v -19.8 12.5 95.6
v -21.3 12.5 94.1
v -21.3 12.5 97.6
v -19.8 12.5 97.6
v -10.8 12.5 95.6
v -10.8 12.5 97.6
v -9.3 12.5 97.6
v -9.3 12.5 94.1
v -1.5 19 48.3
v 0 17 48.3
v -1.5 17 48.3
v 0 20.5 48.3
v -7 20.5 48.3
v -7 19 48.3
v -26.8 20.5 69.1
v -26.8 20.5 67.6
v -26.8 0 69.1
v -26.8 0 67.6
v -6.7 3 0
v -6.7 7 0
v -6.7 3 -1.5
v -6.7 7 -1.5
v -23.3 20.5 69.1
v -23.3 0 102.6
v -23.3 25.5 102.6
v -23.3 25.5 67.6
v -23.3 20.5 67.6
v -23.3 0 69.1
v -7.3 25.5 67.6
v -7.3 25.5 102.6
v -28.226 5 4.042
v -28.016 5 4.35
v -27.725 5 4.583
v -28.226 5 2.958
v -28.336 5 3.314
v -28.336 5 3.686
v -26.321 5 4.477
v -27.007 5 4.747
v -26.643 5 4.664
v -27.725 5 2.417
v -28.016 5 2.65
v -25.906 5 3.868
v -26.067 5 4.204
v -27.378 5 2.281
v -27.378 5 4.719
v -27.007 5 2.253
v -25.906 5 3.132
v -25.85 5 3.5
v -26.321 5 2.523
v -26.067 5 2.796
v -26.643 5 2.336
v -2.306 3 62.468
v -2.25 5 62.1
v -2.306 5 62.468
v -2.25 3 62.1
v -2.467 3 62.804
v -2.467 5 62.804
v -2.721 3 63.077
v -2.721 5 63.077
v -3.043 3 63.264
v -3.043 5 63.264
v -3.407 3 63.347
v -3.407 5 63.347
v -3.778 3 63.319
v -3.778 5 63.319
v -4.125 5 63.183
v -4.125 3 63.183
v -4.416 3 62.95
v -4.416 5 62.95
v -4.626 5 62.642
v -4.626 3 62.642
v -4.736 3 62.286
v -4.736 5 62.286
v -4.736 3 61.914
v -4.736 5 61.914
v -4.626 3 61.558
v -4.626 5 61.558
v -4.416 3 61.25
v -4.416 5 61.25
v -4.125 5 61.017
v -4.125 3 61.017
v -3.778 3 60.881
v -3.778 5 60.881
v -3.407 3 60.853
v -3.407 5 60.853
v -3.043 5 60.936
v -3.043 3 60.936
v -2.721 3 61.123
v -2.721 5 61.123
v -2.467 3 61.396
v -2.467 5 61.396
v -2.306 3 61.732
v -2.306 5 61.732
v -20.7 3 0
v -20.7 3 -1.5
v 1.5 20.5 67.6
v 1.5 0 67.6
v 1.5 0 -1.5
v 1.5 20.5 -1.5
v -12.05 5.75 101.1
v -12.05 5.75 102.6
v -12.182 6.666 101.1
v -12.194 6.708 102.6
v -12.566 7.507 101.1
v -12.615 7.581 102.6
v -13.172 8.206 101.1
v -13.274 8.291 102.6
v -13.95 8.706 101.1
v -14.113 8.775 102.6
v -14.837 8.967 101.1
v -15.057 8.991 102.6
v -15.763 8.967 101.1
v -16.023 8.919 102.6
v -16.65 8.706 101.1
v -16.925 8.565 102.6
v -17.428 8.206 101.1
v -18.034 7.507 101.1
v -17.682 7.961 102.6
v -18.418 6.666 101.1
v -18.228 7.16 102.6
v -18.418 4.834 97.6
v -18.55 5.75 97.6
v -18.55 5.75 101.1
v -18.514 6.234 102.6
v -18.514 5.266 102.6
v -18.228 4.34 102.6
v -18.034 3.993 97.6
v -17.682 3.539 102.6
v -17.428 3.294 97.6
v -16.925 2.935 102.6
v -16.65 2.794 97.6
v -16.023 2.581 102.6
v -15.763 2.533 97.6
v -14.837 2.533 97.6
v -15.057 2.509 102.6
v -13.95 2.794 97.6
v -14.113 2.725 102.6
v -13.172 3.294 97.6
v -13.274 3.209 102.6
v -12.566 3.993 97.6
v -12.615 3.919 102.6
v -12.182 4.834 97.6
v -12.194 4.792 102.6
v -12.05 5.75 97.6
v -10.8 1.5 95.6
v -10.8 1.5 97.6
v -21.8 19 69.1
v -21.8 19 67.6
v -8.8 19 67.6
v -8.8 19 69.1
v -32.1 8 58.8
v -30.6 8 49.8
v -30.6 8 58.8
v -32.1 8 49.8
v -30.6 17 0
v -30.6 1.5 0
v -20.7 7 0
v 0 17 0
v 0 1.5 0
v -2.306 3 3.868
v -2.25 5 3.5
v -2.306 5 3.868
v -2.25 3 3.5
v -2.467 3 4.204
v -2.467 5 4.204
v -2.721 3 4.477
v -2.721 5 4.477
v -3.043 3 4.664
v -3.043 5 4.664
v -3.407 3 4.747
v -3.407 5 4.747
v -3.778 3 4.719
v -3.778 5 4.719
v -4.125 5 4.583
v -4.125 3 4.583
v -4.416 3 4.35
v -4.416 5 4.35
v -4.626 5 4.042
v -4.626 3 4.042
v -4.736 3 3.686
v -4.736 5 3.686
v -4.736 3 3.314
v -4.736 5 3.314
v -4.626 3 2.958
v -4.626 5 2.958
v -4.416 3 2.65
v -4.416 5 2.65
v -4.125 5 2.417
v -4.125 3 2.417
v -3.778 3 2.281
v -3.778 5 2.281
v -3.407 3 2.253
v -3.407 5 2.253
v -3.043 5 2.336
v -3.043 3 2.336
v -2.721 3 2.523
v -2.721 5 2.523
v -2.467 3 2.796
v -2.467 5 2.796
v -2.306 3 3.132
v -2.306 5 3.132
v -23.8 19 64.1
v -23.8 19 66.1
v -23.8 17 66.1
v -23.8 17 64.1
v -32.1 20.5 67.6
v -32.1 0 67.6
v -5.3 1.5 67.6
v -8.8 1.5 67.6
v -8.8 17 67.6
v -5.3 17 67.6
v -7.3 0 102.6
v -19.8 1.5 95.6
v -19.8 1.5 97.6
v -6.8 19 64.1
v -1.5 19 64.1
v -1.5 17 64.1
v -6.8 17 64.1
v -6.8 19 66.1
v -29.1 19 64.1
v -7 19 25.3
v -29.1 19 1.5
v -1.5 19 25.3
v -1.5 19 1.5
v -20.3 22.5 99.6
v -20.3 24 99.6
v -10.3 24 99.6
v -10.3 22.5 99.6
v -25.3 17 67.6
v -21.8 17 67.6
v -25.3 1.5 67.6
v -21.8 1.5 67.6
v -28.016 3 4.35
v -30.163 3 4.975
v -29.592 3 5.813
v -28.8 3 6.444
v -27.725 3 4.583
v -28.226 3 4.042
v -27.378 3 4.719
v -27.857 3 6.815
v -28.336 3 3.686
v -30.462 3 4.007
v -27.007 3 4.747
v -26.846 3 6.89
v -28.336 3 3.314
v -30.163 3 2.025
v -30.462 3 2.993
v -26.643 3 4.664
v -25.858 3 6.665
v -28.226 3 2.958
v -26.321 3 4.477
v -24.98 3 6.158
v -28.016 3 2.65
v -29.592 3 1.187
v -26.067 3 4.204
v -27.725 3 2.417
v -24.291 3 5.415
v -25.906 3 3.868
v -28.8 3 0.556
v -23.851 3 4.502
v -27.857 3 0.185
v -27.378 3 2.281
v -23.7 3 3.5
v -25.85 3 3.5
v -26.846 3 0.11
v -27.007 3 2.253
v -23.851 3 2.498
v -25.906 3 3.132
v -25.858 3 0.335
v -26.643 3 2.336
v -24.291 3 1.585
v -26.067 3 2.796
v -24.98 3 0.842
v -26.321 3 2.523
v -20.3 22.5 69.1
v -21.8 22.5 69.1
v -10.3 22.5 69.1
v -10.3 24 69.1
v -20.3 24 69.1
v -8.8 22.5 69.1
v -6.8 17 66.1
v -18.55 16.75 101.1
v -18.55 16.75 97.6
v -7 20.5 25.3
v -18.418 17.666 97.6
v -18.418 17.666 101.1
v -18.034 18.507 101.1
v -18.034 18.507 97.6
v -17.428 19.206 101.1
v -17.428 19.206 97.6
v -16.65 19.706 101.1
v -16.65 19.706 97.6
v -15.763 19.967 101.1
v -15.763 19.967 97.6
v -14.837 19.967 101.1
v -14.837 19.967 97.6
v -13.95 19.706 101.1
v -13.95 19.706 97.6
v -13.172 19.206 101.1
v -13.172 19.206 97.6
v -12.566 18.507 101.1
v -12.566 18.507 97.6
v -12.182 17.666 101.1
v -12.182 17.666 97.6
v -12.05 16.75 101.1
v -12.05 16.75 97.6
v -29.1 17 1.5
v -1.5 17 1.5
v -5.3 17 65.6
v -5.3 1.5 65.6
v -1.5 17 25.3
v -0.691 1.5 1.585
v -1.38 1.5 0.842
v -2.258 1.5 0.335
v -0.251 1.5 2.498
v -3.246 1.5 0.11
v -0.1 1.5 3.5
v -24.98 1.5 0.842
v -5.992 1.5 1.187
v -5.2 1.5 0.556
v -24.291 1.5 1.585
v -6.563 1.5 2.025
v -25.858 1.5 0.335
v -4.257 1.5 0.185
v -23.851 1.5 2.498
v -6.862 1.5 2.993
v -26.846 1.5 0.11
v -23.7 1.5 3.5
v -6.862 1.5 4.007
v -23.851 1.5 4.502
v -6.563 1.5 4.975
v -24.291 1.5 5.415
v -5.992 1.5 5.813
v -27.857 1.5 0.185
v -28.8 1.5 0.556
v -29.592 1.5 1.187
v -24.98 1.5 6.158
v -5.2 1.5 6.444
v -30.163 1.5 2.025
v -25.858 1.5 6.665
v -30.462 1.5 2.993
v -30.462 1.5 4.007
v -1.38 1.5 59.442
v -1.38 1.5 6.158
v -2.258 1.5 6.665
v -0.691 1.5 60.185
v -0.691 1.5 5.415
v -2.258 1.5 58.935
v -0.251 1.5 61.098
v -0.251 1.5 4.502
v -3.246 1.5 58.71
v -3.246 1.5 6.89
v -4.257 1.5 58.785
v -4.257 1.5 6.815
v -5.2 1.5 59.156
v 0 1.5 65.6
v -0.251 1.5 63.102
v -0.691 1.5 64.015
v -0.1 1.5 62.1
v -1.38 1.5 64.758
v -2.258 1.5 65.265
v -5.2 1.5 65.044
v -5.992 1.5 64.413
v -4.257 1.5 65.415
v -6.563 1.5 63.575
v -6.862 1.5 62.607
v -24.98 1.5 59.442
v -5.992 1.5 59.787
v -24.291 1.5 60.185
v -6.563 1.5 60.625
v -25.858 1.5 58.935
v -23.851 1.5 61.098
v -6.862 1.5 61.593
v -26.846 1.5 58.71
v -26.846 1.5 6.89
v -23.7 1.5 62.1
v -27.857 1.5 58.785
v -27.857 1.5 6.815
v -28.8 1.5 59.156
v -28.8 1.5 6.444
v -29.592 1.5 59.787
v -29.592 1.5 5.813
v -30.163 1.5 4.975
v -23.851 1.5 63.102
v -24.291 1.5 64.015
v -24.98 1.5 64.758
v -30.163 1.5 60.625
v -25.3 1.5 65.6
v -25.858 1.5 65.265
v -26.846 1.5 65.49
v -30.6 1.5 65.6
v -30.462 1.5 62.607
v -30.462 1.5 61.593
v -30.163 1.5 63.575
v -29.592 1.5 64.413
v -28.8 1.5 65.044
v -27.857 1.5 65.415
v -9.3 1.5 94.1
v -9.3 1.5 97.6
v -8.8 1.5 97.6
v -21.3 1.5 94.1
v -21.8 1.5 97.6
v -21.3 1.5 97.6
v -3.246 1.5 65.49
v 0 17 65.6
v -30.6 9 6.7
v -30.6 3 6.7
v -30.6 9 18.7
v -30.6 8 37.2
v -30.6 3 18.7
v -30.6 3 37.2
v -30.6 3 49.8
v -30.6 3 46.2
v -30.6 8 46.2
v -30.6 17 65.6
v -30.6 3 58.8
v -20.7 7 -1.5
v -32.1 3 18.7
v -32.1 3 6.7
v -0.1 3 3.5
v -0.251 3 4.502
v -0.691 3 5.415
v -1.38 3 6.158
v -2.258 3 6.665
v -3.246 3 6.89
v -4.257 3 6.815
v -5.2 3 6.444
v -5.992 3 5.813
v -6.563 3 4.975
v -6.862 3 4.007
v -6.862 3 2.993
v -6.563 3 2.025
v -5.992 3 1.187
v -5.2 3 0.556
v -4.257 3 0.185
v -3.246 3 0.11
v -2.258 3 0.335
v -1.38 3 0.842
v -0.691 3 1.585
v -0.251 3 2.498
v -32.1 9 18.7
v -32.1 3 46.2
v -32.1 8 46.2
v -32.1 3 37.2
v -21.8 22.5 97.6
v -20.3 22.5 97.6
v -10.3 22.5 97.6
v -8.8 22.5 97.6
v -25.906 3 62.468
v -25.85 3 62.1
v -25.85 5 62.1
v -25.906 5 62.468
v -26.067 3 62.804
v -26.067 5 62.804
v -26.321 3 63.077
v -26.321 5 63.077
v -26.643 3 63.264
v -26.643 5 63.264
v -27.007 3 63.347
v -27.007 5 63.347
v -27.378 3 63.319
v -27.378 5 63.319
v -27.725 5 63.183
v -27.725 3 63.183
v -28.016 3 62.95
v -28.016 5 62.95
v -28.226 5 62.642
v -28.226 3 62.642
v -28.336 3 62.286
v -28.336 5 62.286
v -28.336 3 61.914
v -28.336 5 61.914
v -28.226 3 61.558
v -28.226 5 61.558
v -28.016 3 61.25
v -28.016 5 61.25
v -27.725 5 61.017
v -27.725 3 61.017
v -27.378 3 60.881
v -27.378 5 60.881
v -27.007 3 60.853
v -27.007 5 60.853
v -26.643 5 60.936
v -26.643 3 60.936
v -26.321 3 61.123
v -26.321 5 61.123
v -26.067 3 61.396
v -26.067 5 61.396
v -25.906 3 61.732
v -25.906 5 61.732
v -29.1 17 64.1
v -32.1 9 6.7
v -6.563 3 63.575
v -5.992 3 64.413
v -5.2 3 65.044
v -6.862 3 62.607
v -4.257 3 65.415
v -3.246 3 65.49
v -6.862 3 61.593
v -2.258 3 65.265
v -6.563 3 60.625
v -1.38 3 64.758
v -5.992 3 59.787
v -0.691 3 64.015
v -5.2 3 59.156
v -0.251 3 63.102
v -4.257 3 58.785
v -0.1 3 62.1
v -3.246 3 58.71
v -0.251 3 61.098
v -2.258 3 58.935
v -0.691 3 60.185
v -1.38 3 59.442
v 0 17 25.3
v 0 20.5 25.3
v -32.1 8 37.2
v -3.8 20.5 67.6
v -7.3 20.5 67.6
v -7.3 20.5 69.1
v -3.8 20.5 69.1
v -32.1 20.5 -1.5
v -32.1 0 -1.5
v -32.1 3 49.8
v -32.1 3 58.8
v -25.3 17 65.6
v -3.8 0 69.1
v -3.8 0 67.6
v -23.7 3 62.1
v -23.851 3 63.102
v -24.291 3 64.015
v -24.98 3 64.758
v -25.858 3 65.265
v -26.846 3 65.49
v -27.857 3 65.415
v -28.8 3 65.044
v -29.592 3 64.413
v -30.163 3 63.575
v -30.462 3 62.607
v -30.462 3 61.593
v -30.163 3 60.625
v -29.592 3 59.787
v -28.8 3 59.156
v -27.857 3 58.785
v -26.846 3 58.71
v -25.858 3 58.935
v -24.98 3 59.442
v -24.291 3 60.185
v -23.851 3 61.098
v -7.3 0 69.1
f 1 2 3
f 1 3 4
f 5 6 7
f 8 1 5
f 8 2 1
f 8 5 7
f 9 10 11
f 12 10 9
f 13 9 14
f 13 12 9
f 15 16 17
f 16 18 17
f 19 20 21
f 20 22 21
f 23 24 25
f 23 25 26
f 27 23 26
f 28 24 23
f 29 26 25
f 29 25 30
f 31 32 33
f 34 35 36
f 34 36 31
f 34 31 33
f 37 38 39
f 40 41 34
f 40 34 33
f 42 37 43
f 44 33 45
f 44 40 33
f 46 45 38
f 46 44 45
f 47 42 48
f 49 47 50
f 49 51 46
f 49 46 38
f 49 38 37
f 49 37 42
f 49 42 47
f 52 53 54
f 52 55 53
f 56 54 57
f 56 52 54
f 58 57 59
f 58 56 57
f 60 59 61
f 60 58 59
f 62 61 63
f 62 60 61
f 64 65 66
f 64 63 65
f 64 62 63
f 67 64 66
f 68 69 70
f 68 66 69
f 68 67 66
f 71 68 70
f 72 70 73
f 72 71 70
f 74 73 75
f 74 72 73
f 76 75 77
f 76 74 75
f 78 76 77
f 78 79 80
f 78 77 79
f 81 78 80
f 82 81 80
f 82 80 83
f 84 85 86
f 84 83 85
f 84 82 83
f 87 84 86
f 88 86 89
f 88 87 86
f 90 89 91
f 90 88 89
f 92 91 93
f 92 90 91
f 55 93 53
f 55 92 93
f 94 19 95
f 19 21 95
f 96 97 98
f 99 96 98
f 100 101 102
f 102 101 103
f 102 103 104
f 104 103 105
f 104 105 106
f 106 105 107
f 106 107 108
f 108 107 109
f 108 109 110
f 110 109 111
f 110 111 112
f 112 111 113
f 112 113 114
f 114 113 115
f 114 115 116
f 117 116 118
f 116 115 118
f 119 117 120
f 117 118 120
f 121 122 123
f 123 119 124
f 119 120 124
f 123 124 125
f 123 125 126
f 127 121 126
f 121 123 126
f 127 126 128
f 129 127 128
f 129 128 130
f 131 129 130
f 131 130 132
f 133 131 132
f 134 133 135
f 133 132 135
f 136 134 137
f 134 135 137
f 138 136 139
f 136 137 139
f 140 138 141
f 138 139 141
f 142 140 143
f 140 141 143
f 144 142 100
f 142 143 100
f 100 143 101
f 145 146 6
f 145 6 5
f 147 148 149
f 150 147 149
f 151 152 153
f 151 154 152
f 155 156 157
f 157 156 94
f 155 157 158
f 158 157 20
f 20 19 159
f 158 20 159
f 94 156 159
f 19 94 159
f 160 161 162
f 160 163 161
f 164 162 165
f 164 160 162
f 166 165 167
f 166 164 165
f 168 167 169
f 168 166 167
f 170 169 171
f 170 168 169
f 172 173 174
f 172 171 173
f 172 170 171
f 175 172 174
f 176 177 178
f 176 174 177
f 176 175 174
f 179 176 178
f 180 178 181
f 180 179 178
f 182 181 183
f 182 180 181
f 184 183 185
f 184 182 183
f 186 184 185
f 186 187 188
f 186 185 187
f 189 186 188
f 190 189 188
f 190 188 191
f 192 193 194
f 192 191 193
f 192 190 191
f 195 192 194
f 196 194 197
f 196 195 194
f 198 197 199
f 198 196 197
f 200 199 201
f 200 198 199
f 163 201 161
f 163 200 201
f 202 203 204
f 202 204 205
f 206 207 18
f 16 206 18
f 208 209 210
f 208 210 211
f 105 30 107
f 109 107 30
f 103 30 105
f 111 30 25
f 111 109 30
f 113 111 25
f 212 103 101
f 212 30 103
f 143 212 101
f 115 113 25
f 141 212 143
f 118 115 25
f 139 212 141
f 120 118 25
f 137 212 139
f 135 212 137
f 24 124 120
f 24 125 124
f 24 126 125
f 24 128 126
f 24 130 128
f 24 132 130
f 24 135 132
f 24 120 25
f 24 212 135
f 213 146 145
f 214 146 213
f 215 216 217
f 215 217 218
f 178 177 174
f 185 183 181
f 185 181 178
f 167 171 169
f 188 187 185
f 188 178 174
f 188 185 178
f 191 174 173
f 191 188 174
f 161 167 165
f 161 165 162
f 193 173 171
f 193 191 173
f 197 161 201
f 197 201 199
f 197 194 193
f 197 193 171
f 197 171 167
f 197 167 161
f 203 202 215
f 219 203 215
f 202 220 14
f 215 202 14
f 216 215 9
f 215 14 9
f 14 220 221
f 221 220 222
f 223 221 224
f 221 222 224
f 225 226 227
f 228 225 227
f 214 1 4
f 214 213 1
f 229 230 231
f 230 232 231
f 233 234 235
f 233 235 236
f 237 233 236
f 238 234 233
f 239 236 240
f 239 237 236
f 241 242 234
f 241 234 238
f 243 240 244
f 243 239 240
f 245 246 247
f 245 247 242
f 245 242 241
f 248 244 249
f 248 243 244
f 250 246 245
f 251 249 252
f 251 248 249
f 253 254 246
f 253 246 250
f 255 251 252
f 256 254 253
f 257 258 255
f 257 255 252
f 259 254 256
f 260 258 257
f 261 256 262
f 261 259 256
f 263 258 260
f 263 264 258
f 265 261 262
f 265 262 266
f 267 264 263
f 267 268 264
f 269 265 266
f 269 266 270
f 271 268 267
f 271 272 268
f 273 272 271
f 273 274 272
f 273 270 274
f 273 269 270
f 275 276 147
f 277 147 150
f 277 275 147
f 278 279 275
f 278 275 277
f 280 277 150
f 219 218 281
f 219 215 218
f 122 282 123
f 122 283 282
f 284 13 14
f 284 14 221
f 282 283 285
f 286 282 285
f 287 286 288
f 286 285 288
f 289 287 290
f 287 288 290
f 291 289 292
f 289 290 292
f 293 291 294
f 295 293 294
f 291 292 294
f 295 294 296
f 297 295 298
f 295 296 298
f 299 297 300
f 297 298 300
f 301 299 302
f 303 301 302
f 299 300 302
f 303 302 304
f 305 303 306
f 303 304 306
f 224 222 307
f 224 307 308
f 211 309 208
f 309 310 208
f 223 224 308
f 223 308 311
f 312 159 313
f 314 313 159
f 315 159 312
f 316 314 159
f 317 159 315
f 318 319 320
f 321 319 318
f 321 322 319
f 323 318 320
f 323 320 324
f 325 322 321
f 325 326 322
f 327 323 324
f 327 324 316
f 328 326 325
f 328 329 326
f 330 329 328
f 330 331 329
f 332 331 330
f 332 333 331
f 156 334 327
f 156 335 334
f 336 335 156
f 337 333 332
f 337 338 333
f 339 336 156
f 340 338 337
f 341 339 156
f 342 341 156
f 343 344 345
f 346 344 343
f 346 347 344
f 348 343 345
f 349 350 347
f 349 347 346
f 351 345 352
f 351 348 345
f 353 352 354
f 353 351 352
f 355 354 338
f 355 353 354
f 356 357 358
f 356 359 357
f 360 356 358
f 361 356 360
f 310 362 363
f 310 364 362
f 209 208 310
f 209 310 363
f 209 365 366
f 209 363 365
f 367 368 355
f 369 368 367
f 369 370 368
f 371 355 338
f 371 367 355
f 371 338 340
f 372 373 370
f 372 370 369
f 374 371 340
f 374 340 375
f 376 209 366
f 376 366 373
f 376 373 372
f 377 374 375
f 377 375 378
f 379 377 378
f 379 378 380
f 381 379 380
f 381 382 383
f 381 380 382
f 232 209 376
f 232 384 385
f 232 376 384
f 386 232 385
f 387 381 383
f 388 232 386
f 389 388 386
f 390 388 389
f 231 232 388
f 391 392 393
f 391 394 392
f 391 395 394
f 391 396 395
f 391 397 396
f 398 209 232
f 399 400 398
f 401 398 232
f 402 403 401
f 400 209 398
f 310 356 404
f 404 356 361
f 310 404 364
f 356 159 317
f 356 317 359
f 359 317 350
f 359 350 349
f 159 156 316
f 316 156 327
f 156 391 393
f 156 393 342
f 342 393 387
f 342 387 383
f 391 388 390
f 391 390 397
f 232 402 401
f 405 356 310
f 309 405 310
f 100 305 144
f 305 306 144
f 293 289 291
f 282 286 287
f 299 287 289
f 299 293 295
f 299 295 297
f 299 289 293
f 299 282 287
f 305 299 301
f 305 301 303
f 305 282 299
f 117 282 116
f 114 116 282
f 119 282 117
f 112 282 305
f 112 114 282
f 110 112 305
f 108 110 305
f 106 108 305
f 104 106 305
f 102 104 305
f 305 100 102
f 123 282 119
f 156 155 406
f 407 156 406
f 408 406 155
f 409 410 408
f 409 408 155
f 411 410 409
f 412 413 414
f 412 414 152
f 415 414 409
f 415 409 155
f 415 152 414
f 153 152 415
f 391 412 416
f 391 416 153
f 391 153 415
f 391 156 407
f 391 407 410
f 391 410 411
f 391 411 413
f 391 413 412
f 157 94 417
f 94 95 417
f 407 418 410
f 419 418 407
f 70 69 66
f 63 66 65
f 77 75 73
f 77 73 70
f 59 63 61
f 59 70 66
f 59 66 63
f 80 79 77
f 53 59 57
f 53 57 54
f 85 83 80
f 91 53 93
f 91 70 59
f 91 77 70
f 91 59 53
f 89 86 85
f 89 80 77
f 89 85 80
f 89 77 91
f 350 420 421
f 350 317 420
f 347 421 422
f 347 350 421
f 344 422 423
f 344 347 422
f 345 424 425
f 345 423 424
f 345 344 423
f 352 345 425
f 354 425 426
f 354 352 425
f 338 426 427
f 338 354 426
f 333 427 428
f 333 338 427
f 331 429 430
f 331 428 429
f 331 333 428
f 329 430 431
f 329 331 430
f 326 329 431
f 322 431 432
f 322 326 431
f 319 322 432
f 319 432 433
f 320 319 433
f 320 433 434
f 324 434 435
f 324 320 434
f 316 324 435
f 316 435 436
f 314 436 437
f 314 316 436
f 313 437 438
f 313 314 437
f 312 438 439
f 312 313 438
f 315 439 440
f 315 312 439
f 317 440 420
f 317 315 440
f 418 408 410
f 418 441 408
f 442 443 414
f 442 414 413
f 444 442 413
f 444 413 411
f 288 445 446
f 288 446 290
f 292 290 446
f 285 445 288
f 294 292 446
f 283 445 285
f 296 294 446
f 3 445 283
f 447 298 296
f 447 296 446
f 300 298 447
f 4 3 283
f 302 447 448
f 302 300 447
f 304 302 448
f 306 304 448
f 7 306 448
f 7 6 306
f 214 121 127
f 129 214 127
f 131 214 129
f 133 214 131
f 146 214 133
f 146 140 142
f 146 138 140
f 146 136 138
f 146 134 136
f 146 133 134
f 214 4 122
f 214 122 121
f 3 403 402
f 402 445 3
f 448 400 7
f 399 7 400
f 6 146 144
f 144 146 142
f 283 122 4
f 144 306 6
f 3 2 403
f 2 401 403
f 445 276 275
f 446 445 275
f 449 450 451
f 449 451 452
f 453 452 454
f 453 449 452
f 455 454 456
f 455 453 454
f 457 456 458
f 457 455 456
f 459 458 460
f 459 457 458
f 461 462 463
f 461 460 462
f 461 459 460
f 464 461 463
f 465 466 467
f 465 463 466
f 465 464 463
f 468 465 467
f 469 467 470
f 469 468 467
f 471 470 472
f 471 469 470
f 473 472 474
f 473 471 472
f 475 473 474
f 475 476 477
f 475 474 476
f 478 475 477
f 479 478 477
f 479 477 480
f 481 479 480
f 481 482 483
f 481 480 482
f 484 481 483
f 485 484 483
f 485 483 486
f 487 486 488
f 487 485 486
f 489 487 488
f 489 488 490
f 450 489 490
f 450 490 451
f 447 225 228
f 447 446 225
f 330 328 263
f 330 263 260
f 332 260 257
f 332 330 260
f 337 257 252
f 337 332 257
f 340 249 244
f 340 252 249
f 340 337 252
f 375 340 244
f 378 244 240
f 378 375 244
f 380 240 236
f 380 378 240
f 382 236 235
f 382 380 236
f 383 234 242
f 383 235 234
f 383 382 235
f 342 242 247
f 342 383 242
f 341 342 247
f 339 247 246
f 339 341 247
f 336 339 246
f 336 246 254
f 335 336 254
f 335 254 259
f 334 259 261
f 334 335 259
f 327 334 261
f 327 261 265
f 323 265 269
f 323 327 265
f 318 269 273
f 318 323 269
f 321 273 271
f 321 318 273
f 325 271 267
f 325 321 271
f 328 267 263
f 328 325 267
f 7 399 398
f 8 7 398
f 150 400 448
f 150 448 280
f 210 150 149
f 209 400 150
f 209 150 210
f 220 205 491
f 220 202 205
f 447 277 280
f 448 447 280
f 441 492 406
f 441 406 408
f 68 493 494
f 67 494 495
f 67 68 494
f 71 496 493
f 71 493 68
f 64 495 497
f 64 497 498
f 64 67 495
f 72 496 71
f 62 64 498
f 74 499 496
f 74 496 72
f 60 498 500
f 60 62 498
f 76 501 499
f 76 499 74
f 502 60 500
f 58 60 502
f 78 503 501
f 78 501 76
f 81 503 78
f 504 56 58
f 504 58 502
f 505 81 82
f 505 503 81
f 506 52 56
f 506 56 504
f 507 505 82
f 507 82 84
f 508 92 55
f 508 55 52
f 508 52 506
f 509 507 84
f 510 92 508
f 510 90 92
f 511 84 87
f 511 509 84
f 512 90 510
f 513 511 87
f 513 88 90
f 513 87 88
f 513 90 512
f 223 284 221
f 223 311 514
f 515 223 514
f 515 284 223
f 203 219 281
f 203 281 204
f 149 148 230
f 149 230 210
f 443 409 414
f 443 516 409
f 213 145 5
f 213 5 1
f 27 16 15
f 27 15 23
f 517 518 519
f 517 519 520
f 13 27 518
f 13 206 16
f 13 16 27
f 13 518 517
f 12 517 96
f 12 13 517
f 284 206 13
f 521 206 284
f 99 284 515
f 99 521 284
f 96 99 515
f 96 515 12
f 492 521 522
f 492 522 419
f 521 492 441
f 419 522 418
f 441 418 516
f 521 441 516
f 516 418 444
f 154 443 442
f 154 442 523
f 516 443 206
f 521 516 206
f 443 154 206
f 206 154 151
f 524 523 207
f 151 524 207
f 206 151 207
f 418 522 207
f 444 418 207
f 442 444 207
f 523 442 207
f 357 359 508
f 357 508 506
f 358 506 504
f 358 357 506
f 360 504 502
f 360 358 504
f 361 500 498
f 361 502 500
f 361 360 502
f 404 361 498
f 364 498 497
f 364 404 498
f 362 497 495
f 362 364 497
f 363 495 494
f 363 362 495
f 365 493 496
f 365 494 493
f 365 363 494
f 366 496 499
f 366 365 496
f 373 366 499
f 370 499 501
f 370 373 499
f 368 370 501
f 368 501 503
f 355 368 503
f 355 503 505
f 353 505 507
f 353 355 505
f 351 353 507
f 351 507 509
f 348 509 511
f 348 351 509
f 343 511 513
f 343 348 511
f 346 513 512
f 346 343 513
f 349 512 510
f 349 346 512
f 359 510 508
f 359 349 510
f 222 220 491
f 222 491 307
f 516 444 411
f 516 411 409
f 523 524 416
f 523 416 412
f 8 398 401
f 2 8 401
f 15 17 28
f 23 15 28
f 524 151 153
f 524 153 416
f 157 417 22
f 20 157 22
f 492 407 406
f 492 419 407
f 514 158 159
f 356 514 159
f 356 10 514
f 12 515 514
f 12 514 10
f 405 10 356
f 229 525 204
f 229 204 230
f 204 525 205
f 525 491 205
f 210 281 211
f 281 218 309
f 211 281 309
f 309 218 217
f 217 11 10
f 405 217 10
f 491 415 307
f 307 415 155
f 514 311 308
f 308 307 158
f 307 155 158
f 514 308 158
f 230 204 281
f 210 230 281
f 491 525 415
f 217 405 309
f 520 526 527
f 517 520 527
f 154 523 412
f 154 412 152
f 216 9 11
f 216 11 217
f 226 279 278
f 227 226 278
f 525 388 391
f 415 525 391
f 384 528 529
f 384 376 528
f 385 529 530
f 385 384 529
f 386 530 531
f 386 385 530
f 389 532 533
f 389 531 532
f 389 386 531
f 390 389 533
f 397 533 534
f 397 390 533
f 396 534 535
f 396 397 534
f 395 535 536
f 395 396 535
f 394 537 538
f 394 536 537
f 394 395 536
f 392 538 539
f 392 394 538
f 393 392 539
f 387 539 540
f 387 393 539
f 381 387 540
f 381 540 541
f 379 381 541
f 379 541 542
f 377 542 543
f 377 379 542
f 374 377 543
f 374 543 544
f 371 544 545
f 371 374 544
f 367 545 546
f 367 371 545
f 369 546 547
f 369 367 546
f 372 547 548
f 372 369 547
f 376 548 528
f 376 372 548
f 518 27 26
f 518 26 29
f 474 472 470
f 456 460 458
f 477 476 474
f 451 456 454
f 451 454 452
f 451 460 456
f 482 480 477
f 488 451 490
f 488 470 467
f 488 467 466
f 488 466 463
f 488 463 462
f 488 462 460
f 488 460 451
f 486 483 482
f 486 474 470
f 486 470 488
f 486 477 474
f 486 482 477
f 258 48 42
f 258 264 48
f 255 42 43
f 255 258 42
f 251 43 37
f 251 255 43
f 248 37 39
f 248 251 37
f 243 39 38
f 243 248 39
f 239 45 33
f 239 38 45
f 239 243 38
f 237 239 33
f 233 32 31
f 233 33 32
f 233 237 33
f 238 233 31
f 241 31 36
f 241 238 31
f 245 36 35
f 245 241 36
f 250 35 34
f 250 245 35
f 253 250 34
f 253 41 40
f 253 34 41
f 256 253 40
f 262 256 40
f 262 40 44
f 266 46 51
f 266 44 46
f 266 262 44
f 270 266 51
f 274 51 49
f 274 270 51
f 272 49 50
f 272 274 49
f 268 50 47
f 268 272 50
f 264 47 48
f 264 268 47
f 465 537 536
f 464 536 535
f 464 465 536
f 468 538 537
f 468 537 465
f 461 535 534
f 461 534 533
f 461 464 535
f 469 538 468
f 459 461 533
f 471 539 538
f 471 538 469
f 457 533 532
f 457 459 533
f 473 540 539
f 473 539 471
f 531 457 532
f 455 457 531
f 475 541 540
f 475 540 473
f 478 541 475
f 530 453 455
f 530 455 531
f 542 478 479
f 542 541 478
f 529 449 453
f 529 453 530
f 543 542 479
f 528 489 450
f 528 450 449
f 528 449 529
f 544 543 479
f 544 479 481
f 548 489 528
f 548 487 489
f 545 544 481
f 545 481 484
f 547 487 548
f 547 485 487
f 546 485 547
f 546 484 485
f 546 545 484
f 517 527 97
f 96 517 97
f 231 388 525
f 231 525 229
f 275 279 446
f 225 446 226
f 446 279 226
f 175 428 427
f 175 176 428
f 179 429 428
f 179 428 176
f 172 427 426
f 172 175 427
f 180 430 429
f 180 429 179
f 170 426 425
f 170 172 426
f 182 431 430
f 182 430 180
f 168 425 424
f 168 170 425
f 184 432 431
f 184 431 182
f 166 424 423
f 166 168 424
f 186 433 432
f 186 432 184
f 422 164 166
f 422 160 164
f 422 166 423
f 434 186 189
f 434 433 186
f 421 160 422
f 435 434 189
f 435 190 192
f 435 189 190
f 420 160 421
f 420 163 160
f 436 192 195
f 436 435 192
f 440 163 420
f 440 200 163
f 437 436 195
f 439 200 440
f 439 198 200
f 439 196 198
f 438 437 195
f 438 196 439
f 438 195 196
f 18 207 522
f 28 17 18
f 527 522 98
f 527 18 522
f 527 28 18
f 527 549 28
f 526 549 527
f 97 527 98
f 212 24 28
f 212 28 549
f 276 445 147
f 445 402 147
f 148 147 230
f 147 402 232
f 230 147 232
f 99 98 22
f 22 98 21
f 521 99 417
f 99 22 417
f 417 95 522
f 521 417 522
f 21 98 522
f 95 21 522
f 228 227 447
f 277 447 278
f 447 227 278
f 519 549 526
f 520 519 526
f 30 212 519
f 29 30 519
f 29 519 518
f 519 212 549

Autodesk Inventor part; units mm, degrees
ref_plane "YZ Plane" through (0, 0, 0) normal (1, 0, 0) x (0, 1, 0)
ref_plane "XZ Plane" through (0, 0, 0) normal (0, 1, 0) x (-1, 0, 0)
ref_plane "XY Plane" through (0, 0, 0) normal (0, 0, 1) x (1, 0, 0)
sketch "Szkic1" plane through (0, 0, 0) normal (0, 1, 0) x (-1, 0, 0)
  line L0 (0, 0) -> (30.6, 0)
  line L1 (30.6, 0) -> (30.6, 65.6)
  line L2 (30.6, 65.6) -> (0, 65.6)
  line L3 (0, 65.6) -> (0, 0)
  dimension "d0" = 30.6
  dimension "d1" = 65.6
extrude "Wyciągnięcie proste1" add sketch "Szkic1" along normal blind 1.5
sketch "Szkic2" plane through (0, 1.5, 0) normal (0, 1, 0) x (1, 0, 0)
  line L0 (-30.6, 0) -> (-30.6, -65.6) construction
  line L1 (-30.6, -65.6) -> (-30.6, -62.1) construction
  line L2 (-30.6, -62.1) -> (-27.1, -62.1) construction
  line L3 (0, 0) -> (-30.6, 0) construction
  line L4 (0, 0) -> (-3.5, 0) construction
  line L5 (-3.5, 0) -> (-3.5, -3.5) construction
  line L6 (-30.6, -65.6) -> (0, -65.6) construction
  line L7 (0, -65.6) -> (-3.5, -65.6) construction
  line L8 (-3.5, -65.6) -> (-3.5, -62.1) construction
  line L9 (-3.5, -62.1) -> (0, -62.1) construction
  line L10 (0, -62.1) -> (0, -65.6) construction
  line L11 (-30.6, 0) -> (-27.1, 0) construction
  line L12 (-27.1, 0) -> (-27.1, -3.5) construction
  line L13 (-27.1, -3.5) -> (-30.6, -3.5) construction
  line L14 (-30.6, -3.5) -> (-30.6, 0) construction
  circle A0 centre (-27.1, -62.1) radius 3.4
  circle A1 centre (-3.5, -62.1) radius 3.4
  circle A2 centre (-3.5, -3.5) radius 3.4
  circle A3 centre (-27.1, -3.5) radius 3.4
  dimension "d4" = 3.5
  dimension "d5" = 3.5
  dimension "d6" = 3.5
  dimension "d7" = 3.5
  dimension "d8" = 3.5
  dimension "d9" = 3.5
  dimension "d10" = 3.5
  dimension "d11" = 3.5
  dimension "d12" = 6.8
  dimension "d13" = 6.8
  dimension "d14" = 6.8
  dimension "d15" = 6.8
extrude "Wyciągnięcie proste2" add sketch "Szkic2" along normal blind 1.5
sketch "Szkic3" plane through (-27.1, 3, 62.1) normal (0, 1, 0) x (1, 0, 0)
  circle A0 centre (23.6, 0) radius 3.4 projected
  circle A1 centre (23.6, 0) radius 1.25
  circle A2 centre (0, 0) radius 3.4 projected
  circle A3 centre (0, 0) radius 1.25
  circle A4 centre (0, 58.6) radius 3.4 projected
  circle A5 centre (0, 58.6) radius 1.25
  circle A6 centre (23.6, 58.6) radius 3.4 projected
  circle A7 centre (23.6, 58.6) radius 1.25
  point P0 (27.1, 62.1)
  dimension "d18" = 2.5
  dimension "d19" = 2.5
  dimension "d20" = 2.5
  dimension "d21" = 2.5
extrude "Wyciągnięcie proste3" add sketch "Szkic3" along normal blind 2 contours A1 | A3 | A5 | A7
sketch "Szkic4" plane through (0, 0, 0) normal (0, -1, 0) x (1, 0, 0)
  line L0 (-30.6, 65.6) -> (0, 65.6) construction
  line L1 (-15.3, 65.6) -> (-25.3, 65.6) construction
  line L2 (-25.3, 65.6) -> (-5.3, 65.6)
  line L3 (-5.3, 65.6) -> (-5.3, 67.6)
  line L4 (-5.3, 67.6) -> (-25.3, 67.6)
  line L5 (-25.3, 67.6) -> (-25.3, 65.6)
  line L6 (-15.3, 67.6) -> (-21.8, 67.6) construction
  line L7 (-21.8, 67.6) -> (-8.8, 67.6)
  line L8 (-8.8, 67.6) -> (-8.8, 97.6)
  line L9 (-8.8, 97.6) -> (-21.8, 97.6)
  line L10 (-21.8, 97.6) -> (-21.8, 67.6)
  point P0 (0, 0)
  dimension "d24" = 10
  dimension "d25" = 20
  dimension "d26" = 2
  dimension "d27" = 6.5
  dimension "d28" = 13
  dimension "d29" = 30
extrude "Wyciągnięcie proste4" add sketch "Szkic4" against normal blind 1.5
sketch "Szkic6" plane through (0, 0, 0) normal (0, -1, 0) x (1, 0, 0)
  line L0 (-21.8, 97.6) -> (-8.8, 97.6) projected
  line L1 (-8.8, 97.6) -> (-21.8, 97.6)
  line L2 (-21.8, 97.6) -> (-21.8, 101.1)
  line L3 (-21.8, 101.1) -> (-8.8, 101.1)
  line L4 (-8.8, 101.1) -> (-8.8, 97.6)
  point P0 (0, 0)
  dimension "d32" = 13
  dimension "d33" = 3.5
extrude "Wyciągnięcie proste5" add sketch "Szkic6" against normal blind 24
sketch "Szkic7" plane through (0, 1.5, 0) normal (0, 1, 0) x (1, 0, 0)
  line L0 (-21.8, -97.6) -> (-8.8, -97.6) construction
  line L1 (-21.8, -97.6) -> (-19.8, -97.6) construction
  line L2 (-19.8, -97.6) -> (-10.8, -97.6)
  line L3 (-10.8, -97.6) -> (-10.8, -95.6)
  line L4 (-10.8, -95.6) -> (-19.8, -95.6)
  line L5 (-19.8, -95.6) -> (-19.8, -97.6)
  line L6 (-21.8, -97.6) -> (-21.3, -97.6) construction
  line L7 (-21.3, -97.6) -> (-9.3, -97.6)
  line L8 (-9.3, -97.6) -> (-9.3, -94.1)
  line L9 (-9.3, -94.1) -> (-21.3, -94.1)
  line L10 (-21.3, -94.1) -> (-21.3, -97.6)
  point P0 (0, 0)
  dimension "d36" = 2
  dimension "d37" = 9
  dimension "d38" = 2
  dimension "d39" = 0.5
  dimension "d40" = 12
  dimension "d41" = 3.5
extrude "Wyciągnięcie proste6" add sketch "Szkic7" along normal blind 11 contours L7 L10 L9 L8 L3 L4 L5
sketch "Szkic8" plane through (-8.8, 24, 97.6) normal (0, 0, -1) x (-1, 0, 0)
  line L0 (11, -11.5) -> (2, -11.5) construction
  line L1 (6.5, -11.5) -> (6.5, -10.5) construction
  line L2 (6.5, -10.5) -> (6.5, -7.25) construction
  circle A0 centre (6.5, -7.25) radius 3.25
  line L3 (11, -22.5) -> (2, -22.5) construction
  line L4 (6.5, -22.5) -> (6.5, -18.25) construction
  circle A1 centre (6.5, -18.25) radius 3.25
  line L5 (9.75, -7.25) -> (9.75, -18.25)
  line L6 (3.25, -7.25) -> (3.25, -18.25)
  point P0 (-8.8, -24)
  dimension "d44" = 1
  dimension "d45" = 3.25
  dimension "d46" = 6.5
  dimension "d47" = 4.25
  dimension "d48" = 6.5
extrude "Wyciągnięcie proste7" cut sketch "Szkic8" against normal blind 11
sketch "Szkic9" plane through (0, 0, 0) normal (0, -1, 0) x (1, 0, 0)
  line L0 (-21.8, 101.1) -> (-8.8, 101.1)
  line L1 (-8.8, 101.1) -> (-8.8, 102.6)
  line L2 (-8.8, 102.6) -> (-21.8, 102.6)
  line L3 (-21.8, 102.6) -> (-21.8, 101.1)
  point P0 (0, 0)
  dimension "d51" = 13
  dimension "d52" = 1.5
extrude "Wyciągnięcie proste8" add sketch "Szkic9" against normal blind 24
sketch "Szkic10" plane through (-21.8, 0, 102.6) normal (0, 0, 1) x (1, 0, 0)
  line L0 (13, 0) -> (0, 0) construction
  line L1 (6.5, 0) -> (6.5, 5.75) construction
  circle A0 centre (6.5, 5.75) radius 3.25
  point P0 (21.8, 0)
  dimension "d55" = 5.75
  dimension "d56" = 6.5
extrude "Wyciągnięcie proste9" cut sketch "Szkic10" against normal blind 1.5
sketch "Szkic11" plane through (0, 24, 0) normal (0, 1, 0) x (1, 0, 0)
  line L0 (-8.8, -97.6) -> (-21.8, -97.6)
  line L1 (-21.8, -97.6) -> (-21.8, -101.1)
  line L2 (-21.8, -101.1) -> (-8.8, -101.1)
  line L3 (-8.8, -101.1) -> (-8.8, -97.6)
  point P0 (0, 0)
  dimension "d59" = 13
  dimension "d60" = 3.5
extrude "Wyciągnięcie proste10" cut sketch "Szkic11" against normal blind 1.5
sketch "Szkic12" plane through (0, 0, 0) normal (0, -1, 0) x (1, 0, 0)
  line L0 (-30.6, 0) -> (-30.6, 65.6) projected
  line L1 (-30.6, 65.6) -> (-32.1, 65.6)
  line L2 (-32.1, 65.6) -> (-32.1, 0)
  line L3 (-32.1, 0) -> (-30.6, 0)
  line L4 (-30.6, 0) -> (-30.6, 65.6)
  point P0 (0, 0)
  dimension "d82" = 32.1
  dimension "d63" = 1.5
  dimension "d64" = 65.6
extrude "Wyciągnięcie proste11" add sketch "Szkic12" against normal blind 19
sketch "Szkic13" plane through (-32.1, 0, 0) normal (-1, 0, 0) x (0, 0, 1)
  line L0 (65.6, 0) -> (65.6, 1.5) construction
  line L1 (65.6, 0) -> (65.6, 3) construction
  line L2 (65.6, 1.5) -> (65.6, 19) construction
  line L3 (65.6, 3) -> (0, 3) construction
  line L4 (0, 3) -> (54.3, 3) construction
  line L5 (0, 3) -> (41.7, 3) construction
  line L6 (0, 3) -> (12.7, 3) construction
  line L7 (54.3, 3) -> (58.8, 3) construction
  line L8 (41.7, 3) -> (46.2, 3) construction
  line L9 (46.2, 3) -> (37.2, 3)
  line L10 (37.2, 3) -> (37.2, 8)
  line L11 (37.2, 8) -> (46.2, 8)
  line L12 (46.2, 8) -> (46.2, 3)
  line L13 (58.8, 3) -> (49.8, 3)
  line L14 (49.8, 3) -> (49.8, 8)
  line L15 (49.8, 8) -> (58.8, 8)
  line L16 (58.8, 8) -> (58.8, 3)
  line L17 (12.7, 3) -> (18.7, 3) construction
  line L18 (18.7, 3) -> (6.7, 3)
  line L19 (6.7, 3) -> (6.7, 9)
  line L20 (6.7, 9) -> (18.7, 9)
  line L21 (18.7, 9) -> (18.7, 3)
  point P0 (0, 0)
  dimension "d67" = 3
  dimension "d68" = 54.3
  dimension "d69" = 41.7
  dimension "d70" = 12.7
  dimension "d71" = 4.5
  dimension "d72" = 4.5
  dimension "d73" = 9
  dimension "d74" = 5
  dimension "d75" = 9
  dimension "d76" = 5
  dimension "d77" = 6
  dimension "d78" = 12
  dimension "d79" = 6
extrude "Wyciągnięcie proste12" cut sketch "Szkic13" against normal blind 1.5
sketch "Szkic14" plane through (0, 0, 0) normal (0, -1, 0) x (1, 0, 0)
  line L0 (-32.1, 65.6) -> (-32.1, 0) projected
  line L1 (-32.1, 0) -> (0, 0)
  line L2 (0, 0) -> (0, -1.5)
  line L3 (0, -1.5) -> (-32.1, -1.5)
  line L4 (-32.1, -1.5) -> (-32.1, 0)
  dimension "d82" = 32.1
  dimension "d83" = 1.5
extrude "Wyciągnięcie proste13" add sketch "Szkic14" against normal blind 19
sketch "Szkic15" plane through (0, 0, -1.5) normal (0, 0, -1) x (-1, 0, 0)
  line L0 (32.1, 0) -> (32.1, 19) construction
  line L1 (32.1, 0) -> (32.1, 3) construction
  line L2 (6.9, 3) -> (0.1, 3) construction
  line L3 (32.1, 3) -> (0.1, 3) construction
  line L4 (0.1, 3) -> (6.7, 3) construction
  line L5 (6.7, 3) -> (20.7, 3)
  line L6 (20.7, 3) -> (20.7, 7)
  line L7 (20.7, 7) -> (6.7, 7)
  line L8 (6.7, 7) -> (6.7, 3)
  point P0 (0, 0)
  dimension "d86" = 3
  dimension "d87" = 6.6
  dimension "d88" = 14
  dimension "d89" = 4
extrude "Wyciągnięcie proste14" cut sketch "Szkic15" against normal blind 1.5
sketch "Szkic16" plane through (0, 0, 0) normal (0, -1, 0) x (1, 0, 0)
  line L0 (0, 65.6) -> (0, 0) projected
  line L1 (0, 65.6) -> (1.5, 65.6)
  line L2 (1.5, 65.6) -> (1.5, -1.5)
  line L3 (1.5, -1.5) -> (0, -1.5)
  line L4 (0, -1.5) -> (0, 65.6)
  dimension "d92" = 1.5
extrude "Wyciągnięcie proste15" add sketch "Szkic16" against normal blind 19
sketch "Szkic18" plane through (0, 0, 0) normal (0, -1, 0) x (1, 0, 0)
  line L0 (1.5, 65.6) -> (1.5, -1.5) projected
  line L1 (-5.3, 65.6) -> (-5.3, 67.6) projected
  line L2 (1.5, 65.6) -> (-5.3, 65.6)
  line L3 (-5.3, 65.6) -> (-5.3, 67.6)
  line L4 (-5.3, 67.6) -> (1.5, 67.6)
  line L5 (1.5, 67.6) -> (1.5, 65.6)
  line L6 (-25.3, 65.6) -> (-32.1, 65.6) projected
  line L7 (-21.8, 67.6) -> (-25.3, 67.6) projected
  line L8 (-32.1, 65.6) -> (-25.3, 65.6)
  line L9 (-25.3, 65.6) -> (-25.3, 67.6)
  line L10 (-25.3, 67.6) -> (-32.1, 67.6)
  line L11 (-32.1, 67.6) -> (-32.1, 65.6)
  point P0 (0, 0)
extrude "Wyciągnięcie proste16" add sketch "Szkic18" against normal blind 19
sketch "Szkic19" plane through (0, 0, 0) normal (0, -1, 0) x (1, 0, 0)
  line L0 (-8.8, 97.6) -> (-8.8, 67.6) construction
  line L1 (-8.8, 67.6) -> (-7.3, 67.6) construction
  line L2 (-7.3, 67.6) -> (-7.3, 69.1) construction
  line L3 (-7.3, 69.1) -> (-8.8, 69.1) construction
  line L4 (-8.8, 69.1) -> (-8.8, 67.6) construction
  line L5 (-21.8, 67.6) -> (-21.8, 97.6) construction
  line L6 (-21.8, 67.6) -> (-23.3, 67.6) construction
  line L7 (-23.3, 67.6) -> (-23.3, 69.1) construction
  line L8 (-23.3, 69.1) -> (-21.8, 69.1) construction
  line L9 (-21.8, 69.1) -> (-21.8, 67.6) construction
  line L10 (-5.3, 67.6) -> (1.5, 67.6) construction
  line L11 (-5.3, 67.6) -> (-5.3, 69.1) construction
  line L12 (-25.3, 67.6) -> (-21.8, 67.6) construction
  line L13 (-25.3, 67.6) -> (-25.3, 69.1) construction
  line L14 (-5.3, 69.1) -> (-3.8, 69.1) construction
  line L15 (-3.8, 69.1) -> (-3.8, 67.6) construction
  line L16 (-3.8, 67.6) -> (-5.3, 67.6) construction
  line L17 (-5.3, 67.6) -> (-5.3, 69.1) construction
  line L18 (-25.3, 69.1) -> (-26.8, 69.1) construction
  line L19 (-26.8, 69.1) -> (-26.8, 67.6) construction
  line L20 (-26.8, 67.6) -> (-25.3, 67.6) construction
  line L21 (-25.3, 67.6) -> (-25.3, 69.1) construction
  line L22 (-8.8, 67.6) -> (-8.8, 102.6) construction
  line L23 (-8.8, 102.6) -> (-7.3, 102.6) construction
  line L24 (-21.8, 102.6) -> (-21.8, 67.6) construction
  line L25 (-21.8, 102.6) -> (-23.3, 102.6) construction
  line L26 (-7.3, 102.6) -> (-8.8, 102.6)
  line L27 (-8.8, 102.6) -> (-8.8, 69.1)
  line L28 (-8.8, 69.1) -> (-7.3, 69.1)
  line L29 (-7.3, 69.1) -> (-7.3, 102.6)
  line L30 (-23.3, 102.6) -> (-21.8, 102.6)
  line L31 (-21.8, 102.6) -> (-21.8, 69.1)
  line L32 (-21.8, 69.1) -> (-23.3, 69.1)
  line L33 (-23.3, 69.1) -> (-23.3, 102.6)
  line L34 (-8.8, 67.6) -> (-5.3, 67.6) projected
  line L35 (-3.8, 69.1) -> (-8.8, 69.1)
  line L36 (-8.8, 69.1) -> (-8.8, 67.6)
  line L37 (-8.8, 67.6) -> (-3.8, 67.6)
  line L38 (-3.8, 67.6) -> (-3.8, 69.1)
  line L39 (-26.8, 67.6) -> (-21.8, 67.6)
  line L40 (-21.8, 67.6) -> (-21.8, 69.1)
  line L41 (-21.8, 69.1) -> (-26.8, 69.1)
  line L42 (-26.8, 69.1) -> (-26.8, 67.6)
  point P0 (0, 0)
  dimension "d97" = 1.5
  dimension "d98" = 1.5
  dimension "d99" = 1.5
  dimension "d100" = 1.5
  dimension "d101" = 1.5
  dimension "d102" = 1.5
  dimension "d103" = 1.5
  dimension "d104" = 1.5
  dimension "d105" = 1.5
  dimension "d106" = 1.5
extrude "Wyciągnięcie proste17" add sketch "Szkic19" against normal blind 24 contours L29 L28 L27 L26 | L30 L31 L32 L33
sketch "Szkic20" plane through (0, 0, 0) normal (0, -1, 0) x (1, 0, 0)
  line L0 (-25.3, 67.6) -> (-21.8, 67.6) construction
  line L1 (-25.3, 67.6) -> (-26.8, 67.6) construction
  line L2 (-26.8, 67.6) -> (-26.8, 69.1) construction
  line L3 (-26.8, 69.1) -> (-25.3, 69.1) construction
  line L4 (-25.3, 69.1) -> (-25.3, 67.6) construction
  line L5 (-8.8, 67.6) -> (-5.3, 67.6) construction
  line L6 (-5.3, 67.6) -> (-3.8, 67.6) construction
  line L7 (-3.8, 67.6) -> (-3.8, 69.1) construction
  line L8 (-3.8, 69.1) -> (-5.3, 69.1) construction
  line L9 (-5.3, 69.1) -> (-5.3, 67.6) construction
  line L10 (-26.8, 69.1) -> (-21.8, 69.1)
  line L11 (-21.8, 69.1) -> (-21.8, 67.6)
  line L12 (-21.8, 67.6) -> (-26.8, 67.6)
  line L13 (-26.8, 67.6) -> (-26.8, 69.1)
  line L14 (-8.8, 67.6) -> (-3.8, 67.6)
  line L15 (-3.8, 67.6) -> (-3.8, 69.1)
  line L16 (-3.8, 69.1) -> (-8.8, 69.1)
  line L17 (-8.8, 69.1) -> (-8.8, 67.6)
  point P0 (0, 0)
  dimension "d109" = 1.5
  dimension "d110" = 1.5
  dimension "d111" = 1.5
  dimension "d112" = 1.5
extrude "Wyciągnięcie proste18" add sketch "Szkic20" against normal blind 19
sketch "Szkic21" plane through (0, 19, 0) normal (0, 1, 0) x (1, 0, 0)
  line L0 (-5.3, -65.6) -> (-5.3, -67.6) projected
  line L1 (-25.3, -67.6) -> (-5.3, -67.6)
  line L2 (0, -65.6) -> (-5.3, -65.6) projected
  line L3 (-5.3, -67.6) -> (-5.3, -65.6)
  line L4 (-5.3, -65.6) -> (0, -65.6)
  line L5 (0, 0) -> (0, -65.6) projected
  line L6 (0, -65.6) -> (0, 0)
  line L7 (-30.6, -65.6) -> (-30.6, 0) projected
  line L8 (0, 0) -> (-30.6, 0)
  line L9 (-30.6, 0) -> (-30.6, -65.6)
  line L10 (-25.3, -67.6) -> (-25.3, -65.6) projected
  line L11 (-30.6, -65.6) -> (-25.3, -65.6)
  line L12 (-25.3, -65.6) -> (-25.3, -67.6)
  line L13 (-30.6, -65.6) -> (-29.1, -65.6) construction
  line L14 (-29.1, -65.6) -> (-29.1, -64.1) construction
  line L15 (-29.1, -64.1) -> (-30.6, -64.1) construction
  line L16 (-30.6, -64.1) -> (-30.6, -65.6) construction
  line L17 (-30.6, 0) -> (-29.1, 0) construction
  line L18 (-29.1, 0) -> (-29.1, -1.5) construction
  line L19 (-29.1, -1.5) -> (-30.6, -1.5) construction
  line L20 (-30.6, -1.5) -> (-30.6, 0) construction
  line L21 (0, 0) -> (-1.5, 0) construction
  line L22 (-1.5, 0) -> (-1.5, -1.5) construction
  line L23 (-1.5, -1.5) -> (0, -1.5) construction
  line L24 (0, -1.5) -> (0, 0) construction
  line L25 (0, -65.6) -> (-1.5, -65.6) construction
  line L26 (-1.5, -65.6) -> (-1.5, -64.1) construction
  line L27 (-1.5, -64.1) -> (0, -64.1) construction
  line L28 (0, -64.1) -> (0, -65.6) construction
  line L29 (-5.3, -65.6) -> (-6.8, -65.6) construction
  line L30 (-6.8, -65.6) -> (-6.8, -64.1) construction
  line L31 (-6.8, -64.1) -> (-5.3, -64.1) construction
  line L32 (-5.3, -64.1) -> (-5.3, -65.6) construction
  line L33 (-5.3, -67.6) -> (-6.8, -67.6) construction
  line L34 (-6.8, -67.6) -> (-6.8, -66.1) construction
  line L35 (-6.8, -66.1) -> (-5.3, -66.1) construction
  line L36 (-5.3, -66.1) -> (-5.3, -67.6) construction
  line L37 (-21.8, -67.6) -> (-25.3, -67.6) construction
  line L38 (-25.3, -67.6) -> (-23.8, -67.6) construction
  line L39 (-23.8, -67.6) -> (-23.8, -66.1) construction
  line L40 (-23.8, -66.1) -> (-25.3, -66.1) construction
  line L41 (-25.3, -66.1) -> (-25.3, -67.6) construction
  line L42 (-25.3, -65.6) -> (-23.8, -65.6) construction
  line L43 (-23.8, -65.6) -> (-23.8, -64.1) construction
  line L44 (-23.8, -64.1) -> (-25.3, -64.1) construction
  line L45 (-25.3, -64.1) -> (-25.3, -65.6) construction
  line L46 (-29.1, -64.1) -> (-29.1, -1.5)
  line L47 (-29.1, -1.5) -> (-1.5, -1.5)
  line L48 (-1.5, -1.5) -> (-1.5, -64.1)
  line L49 (-1.5, -64.1) -> (-6.8, -64.1)
  line L50 (-6.8, -64.1) -> (-6.8, -66.1)
  line L51 (-6.8, -66.1) -> (-23.8, -66.1)
  line L52 (-23.8, -66.1) -> (-23.8, -64.1)
  line L53 (-23.8, -64.1) -> (-29.1, -64.1)
  dimension "d115" = 1.5
  dimension "d116" = 1.5
  dimension "d117" = 1.5
  dimension "d118" = 1.5
  dimension "d119" = 1.5
  dimension "d120" = 1.5
  dimension "d121" = 1.5
  dimension "d122" = 1.5
  dimension "d123" = 1.5
  dimension "d124" = 1.5
  dimension "d125" = 1.5
  dimension "d126" = 1.5
  dimension "d127" = 1.5
  dimension "d128" = 1.5
  dimension "d129" = 1.5
  dimension "d130" = 1.5
extrude "Wyciągnięcie proste19" add sketch "Szkic21" against normal blind 2
sketch "Szkic22" plane through (0, 19, 0) normal (0, 1, 0) x (1, 0, 0)
  line L0 (1.5, -67.6) -> (1.5, 1.5) projected
  line L1 (1.5, -67.6) -> (1.5, 1.5)
  line L2 (1.5, 1.5) -> (-32.1, 1.5) projected
  line L3 (1.5, 1.5) -> (-32.1, 1.5)
  line L4 (-32.1, -67.6) -> (-26.8, -67.6) projected
  line L5 (-32.1, 1.5) -> (-32.1, -67.6)
  line L6 (-32.1, -67.6) -> (-26.8, -67.6)
  line L7 (-26.8, -69.1) -> (-23.3, -69.1) projected
  line L8 (-26.8, -67.6) -> (-26.8, -69.1)
  line L9 (-7.3, -69.1) -> (-3.8, -69.1) projected
  line L10 (-26.8, -69.1) -> (-3.8, -69.1)
  line L11 (-3.8, -69.1) -> (-3.8, -67.6)
  line L12 (-3.8, -67.6) -> (1.5, -67.6) projected
  line L13 (-3.8, -67.6) -> (1.5, -67.6)
  point P0 (0, 0)
extrude "Wyciągnięcie proste20" add sketch "Szkic22" along normal blind 1.5
sketch "Szkic23" plane through (0, 24, 0) normal (0, 1, 0) x (1, 0, 0)
  line L0 (-21.8, -101.1) -> (-21.8, -97.6) projected
  line L1 (-8.8, -67.6) -> (-8.8, -69.1) projected
  line L2 (-21.8, -101.1) -> (-8.8, -101.1)
  line L3 (-8.8, -101.1) -> (-8.8, -69.1)
  line L4 (-8.8, -69.1) -> (-21.8, -69.1)
  line L5 (-21.8, -69.1) -> (-21.8, -101.1)
  line L6 (-21.8, -101.1) -> (-20.3, -101.1) construction
  line L7 (-20.3, -101.1) -> (-20.3, -99.6) construction
  line L8 (-20.3, -99.6) -> (-21.8, -99.6) construction
  line L9 (-21.8, -99.6) -> (-21.8, -101.1) construction
  line L10 (-8.8, -69.1) -> (-10.3, -69.1) construction
  line L11 (-21.8, -69.1) -> (-8.8, -69.1) construction
  line L12 (-20.3, -99.6) -> (-10.3, -99.6)
  line L13 (-10.3, -99.6) -> (-10.3, -69.1)
  line L14 (-10.3, -69.1) -> (-20.3, -69.1)
  line L15 (-20.3, -69.1) -> (-20.3, -99.6)
  point P0 (0, 0)
  dimension "d135" = 1.5
  dimension "d136" = 1.5
  dimension "d137" = 1.5
extrude "Wyciągnięcie proste21" add sketch "Szkic23" against normal blind 1.5 contours L0 L5 L4 L15 L12 L13 L3 L2
sketch "Szkic24" plane through (0, 24, 0) normal (0, 1, 0) x (1, 0, 0)
  line L0 (-23.3, -69.1) -> (-23.3, -102.6) projected
  line L1 (-23.3, -69.1) -> (-7.3, -69.1)
  line L2 (-7.3, -69.1) -> (-7.3, -67.6)
  line L3 (-7.3, -67.6) -> (-23.3, -67.6)
  line L4 (-23.3, -67.6) -> (-23.3, -69.1)
  point P0 (0, 0)
  dimension "d140" = 16
  dimension "d141" = 1.5
extrude "Wyciągnięcie proste22" add sketch "Szkic24" against normal blind 3.5
sketch "Szkic25" plane through (0, 24, 0) normal (0, 1, 0) x (1, 0, 0)
  line L0 (-7.3, -102.6) -> (-7.3, -69.1) projected
  line L1 (-23.3, -69.1) -> (-23.3, -67.6) projected
  line L2 (-7.3, -102.6) -> (-23.3, -102.6)
  line L3 (-23.3, -102.6) -> (-23.3, -67.6)
  line L4 (-23.3, -67.6) -> (-7.3, -67.6)
  line L5 (-7.3, -67.6) -> (-7.3, -102.6)
  point P0 (0, 0)
extrude "Wyciągnięcie proste23" add sketch "Szkic25" along normal blind 1.5
sketch "Szkic26" plane through (0, 20.5, 0) normal (0, 1, 0) x (1, 0, 0)
  line L0 (1.5, -67.6) -> (1.5, 1.5) construction
  line L1 (1.5, 1.5) -> (1.5, -0.3) construction
  line L2 (1.5, -0.3) -> (1.5, -25.3) construction
  line L3 (1.5, -0.3) -> (1.5, -48.3) construction
  line L4 (1.5, -48.3) -> (0, -48.3) construction
  line L5 (0, -48.3) -> (-7, -48.3)
  line L6 (-7, -48.3) -> (-7, -25.3)
  line L7 (-7, -25.3) -> (0, -25.3)
  line L8 (0, -25.3) -> (0, -48.3)
  point P0 (0, 0)
  dimension "d146" = 1.8
  dimension "d147" = 25
  dimension "d148" = 48
  dimension "d149" = 7
extrude "Wyciągnięcie proste24" cut sketch "Szkic26" against normal blind 5
properties part number "gora"
